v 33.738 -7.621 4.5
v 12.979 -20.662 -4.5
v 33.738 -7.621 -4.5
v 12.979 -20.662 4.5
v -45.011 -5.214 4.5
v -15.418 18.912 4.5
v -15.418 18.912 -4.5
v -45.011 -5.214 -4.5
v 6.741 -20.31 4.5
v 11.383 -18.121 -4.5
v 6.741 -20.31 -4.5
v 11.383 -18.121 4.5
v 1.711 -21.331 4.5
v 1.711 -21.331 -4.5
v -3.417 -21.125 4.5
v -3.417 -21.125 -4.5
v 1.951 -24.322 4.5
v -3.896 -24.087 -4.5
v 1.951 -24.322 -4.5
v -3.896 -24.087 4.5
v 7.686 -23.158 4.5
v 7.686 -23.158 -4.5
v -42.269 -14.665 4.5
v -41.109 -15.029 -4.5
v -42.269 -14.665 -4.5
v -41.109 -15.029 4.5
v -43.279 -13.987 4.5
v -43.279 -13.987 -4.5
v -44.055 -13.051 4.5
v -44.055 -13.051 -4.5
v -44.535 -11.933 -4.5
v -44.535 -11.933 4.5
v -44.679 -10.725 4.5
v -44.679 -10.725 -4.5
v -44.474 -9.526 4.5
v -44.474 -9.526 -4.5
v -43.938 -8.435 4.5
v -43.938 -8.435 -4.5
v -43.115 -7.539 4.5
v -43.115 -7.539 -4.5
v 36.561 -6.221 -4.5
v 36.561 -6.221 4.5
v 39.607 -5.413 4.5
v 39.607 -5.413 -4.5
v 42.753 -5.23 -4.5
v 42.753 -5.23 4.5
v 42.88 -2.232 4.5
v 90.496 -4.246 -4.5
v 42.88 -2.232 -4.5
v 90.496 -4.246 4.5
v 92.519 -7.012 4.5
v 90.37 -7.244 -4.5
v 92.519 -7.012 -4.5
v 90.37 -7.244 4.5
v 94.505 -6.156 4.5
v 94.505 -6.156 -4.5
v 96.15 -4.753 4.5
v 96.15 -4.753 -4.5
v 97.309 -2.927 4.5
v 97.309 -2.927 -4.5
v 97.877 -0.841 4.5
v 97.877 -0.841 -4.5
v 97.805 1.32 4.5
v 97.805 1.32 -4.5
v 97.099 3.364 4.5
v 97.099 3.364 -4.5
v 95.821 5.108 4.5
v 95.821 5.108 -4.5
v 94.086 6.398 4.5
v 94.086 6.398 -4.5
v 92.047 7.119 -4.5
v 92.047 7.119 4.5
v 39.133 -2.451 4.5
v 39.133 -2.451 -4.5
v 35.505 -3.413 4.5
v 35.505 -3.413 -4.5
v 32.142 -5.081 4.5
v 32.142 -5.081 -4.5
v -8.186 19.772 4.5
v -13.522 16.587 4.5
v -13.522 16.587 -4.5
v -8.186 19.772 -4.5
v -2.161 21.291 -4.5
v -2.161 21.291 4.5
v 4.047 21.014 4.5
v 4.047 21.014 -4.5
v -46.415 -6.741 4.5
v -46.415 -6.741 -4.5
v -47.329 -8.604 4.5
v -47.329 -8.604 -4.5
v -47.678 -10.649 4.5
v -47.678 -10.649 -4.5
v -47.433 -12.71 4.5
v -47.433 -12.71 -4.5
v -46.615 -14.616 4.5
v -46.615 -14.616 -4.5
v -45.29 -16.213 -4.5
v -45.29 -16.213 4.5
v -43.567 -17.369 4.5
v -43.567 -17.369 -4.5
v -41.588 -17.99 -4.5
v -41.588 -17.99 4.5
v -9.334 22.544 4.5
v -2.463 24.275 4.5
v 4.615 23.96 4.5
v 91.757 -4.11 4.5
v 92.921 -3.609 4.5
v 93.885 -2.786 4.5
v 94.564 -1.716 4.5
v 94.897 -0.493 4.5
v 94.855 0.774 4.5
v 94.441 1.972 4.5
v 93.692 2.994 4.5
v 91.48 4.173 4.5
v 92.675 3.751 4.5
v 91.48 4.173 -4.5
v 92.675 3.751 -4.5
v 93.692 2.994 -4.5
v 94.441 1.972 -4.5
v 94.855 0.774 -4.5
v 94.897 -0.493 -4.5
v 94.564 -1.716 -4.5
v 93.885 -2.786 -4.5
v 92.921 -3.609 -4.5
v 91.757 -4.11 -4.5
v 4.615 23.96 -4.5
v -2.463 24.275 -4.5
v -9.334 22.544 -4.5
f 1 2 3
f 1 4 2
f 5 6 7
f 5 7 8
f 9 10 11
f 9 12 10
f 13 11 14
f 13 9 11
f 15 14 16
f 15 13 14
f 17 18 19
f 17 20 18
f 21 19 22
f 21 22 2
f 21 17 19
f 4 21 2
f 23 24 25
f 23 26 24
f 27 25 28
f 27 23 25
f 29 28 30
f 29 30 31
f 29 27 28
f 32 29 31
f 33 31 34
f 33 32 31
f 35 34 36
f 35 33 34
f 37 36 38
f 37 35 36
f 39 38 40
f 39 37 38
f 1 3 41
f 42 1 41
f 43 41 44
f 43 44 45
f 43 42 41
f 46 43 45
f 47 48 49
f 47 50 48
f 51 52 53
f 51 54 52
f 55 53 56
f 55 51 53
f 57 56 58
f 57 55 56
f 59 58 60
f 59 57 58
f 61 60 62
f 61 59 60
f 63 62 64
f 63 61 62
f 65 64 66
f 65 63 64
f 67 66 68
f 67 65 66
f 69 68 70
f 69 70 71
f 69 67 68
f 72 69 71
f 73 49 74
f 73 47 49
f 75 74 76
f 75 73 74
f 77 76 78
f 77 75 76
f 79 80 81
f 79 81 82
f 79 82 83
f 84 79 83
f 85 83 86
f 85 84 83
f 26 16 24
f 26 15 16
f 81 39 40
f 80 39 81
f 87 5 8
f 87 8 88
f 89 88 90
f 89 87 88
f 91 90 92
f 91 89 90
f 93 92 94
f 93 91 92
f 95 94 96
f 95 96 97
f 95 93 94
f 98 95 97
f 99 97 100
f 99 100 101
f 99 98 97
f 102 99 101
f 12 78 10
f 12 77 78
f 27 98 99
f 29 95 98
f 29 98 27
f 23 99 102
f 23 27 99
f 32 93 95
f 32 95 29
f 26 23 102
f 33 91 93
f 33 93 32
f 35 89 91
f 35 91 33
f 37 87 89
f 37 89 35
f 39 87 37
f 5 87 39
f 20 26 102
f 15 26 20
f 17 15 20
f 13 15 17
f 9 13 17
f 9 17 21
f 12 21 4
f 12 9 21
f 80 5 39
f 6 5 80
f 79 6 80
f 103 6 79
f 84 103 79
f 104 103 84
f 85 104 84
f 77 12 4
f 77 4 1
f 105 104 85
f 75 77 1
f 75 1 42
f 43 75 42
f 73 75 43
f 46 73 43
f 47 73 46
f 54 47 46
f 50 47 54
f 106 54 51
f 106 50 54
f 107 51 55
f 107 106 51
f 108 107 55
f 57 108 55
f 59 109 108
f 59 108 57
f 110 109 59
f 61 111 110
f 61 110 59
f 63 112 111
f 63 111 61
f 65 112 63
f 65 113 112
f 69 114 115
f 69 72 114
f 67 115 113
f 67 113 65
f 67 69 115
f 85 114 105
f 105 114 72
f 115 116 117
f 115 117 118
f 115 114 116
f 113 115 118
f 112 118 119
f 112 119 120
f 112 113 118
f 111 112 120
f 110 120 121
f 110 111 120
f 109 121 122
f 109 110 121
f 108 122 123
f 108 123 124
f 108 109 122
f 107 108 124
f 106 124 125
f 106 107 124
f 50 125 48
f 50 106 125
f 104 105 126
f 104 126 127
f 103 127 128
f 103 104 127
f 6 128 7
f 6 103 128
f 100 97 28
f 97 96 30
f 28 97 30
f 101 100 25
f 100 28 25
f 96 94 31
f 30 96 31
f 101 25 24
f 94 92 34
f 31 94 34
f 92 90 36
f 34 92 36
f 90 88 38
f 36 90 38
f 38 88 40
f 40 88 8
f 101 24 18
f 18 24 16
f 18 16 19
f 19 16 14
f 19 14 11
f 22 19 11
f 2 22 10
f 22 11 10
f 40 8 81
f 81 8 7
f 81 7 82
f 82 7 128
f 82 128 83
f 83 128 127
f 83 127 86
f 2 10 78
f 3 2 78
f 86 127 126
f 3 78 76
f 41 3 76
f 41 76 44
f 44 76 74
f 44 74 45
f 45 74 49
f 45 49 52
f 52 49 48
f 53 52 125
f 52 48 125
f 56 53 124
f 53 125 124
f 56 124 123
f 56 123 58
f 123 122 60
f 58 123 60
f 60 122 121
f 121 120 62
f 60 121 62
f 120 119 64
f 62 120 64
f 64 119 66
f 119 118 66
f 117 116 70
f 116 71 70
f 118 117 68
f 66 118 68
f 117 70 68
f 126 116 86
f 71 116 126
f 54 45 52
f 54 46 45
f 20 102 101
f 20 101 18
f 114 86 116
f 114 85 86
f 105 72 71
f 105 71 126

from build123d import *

# Parameters (mm, degrees)
RESSALTO_EXTRUS_O1_DEPTH = 4.5


with BuildPart() as part:
    # Esboço1 → Ressalto-extrusão1 (new body, symmetric)
    with BuildSketch(Plane.XY):
        with BuildLine():
            ThreePointArc((90.369647409, -7.243523717), (97.877064824, -0.841102514), (92.047248027, 7.119145574))
            Line((92.047248027, 7.119145574), (4.614891567, 23.959607172))
            ThreePointArc((4.614891567, 23.959607172), (-5.96196459, 23.660409511), (-15.417653704, 18.911794052))
            Line((-15.417653704, 18.911794052), (-45.010991752, -5.213883118))
            ThreePointArc((-45.010991752, -5.213883118), (-47.432888855, -12.709604263), (-41.587603866, -17.990140644))
            Line((-41.587603866, -17.990140644), (-3.896182749, -24.086920932))
            ThreePointArc((-3.896182749, -24.086920932), (4.853764128, -23.912360272), (12.979282584, -20.661515521))
            Line((12.979282584, -20.661515521), (33.738260666, -7.621008284))
            ThreePointArc((33.738260666, -7.621008284), (38.064016153, -5.740396954), (42.753139424, -5.229532527))
            Line((42.753139424, -5.229532527), (90.369647409, -7.243523717))
        make_face()
        with BuildLine():
            ThreePointArc((-13.522040544, 16.586573471), (-5.228936157, 20.751342768), (4.047486866, 21.013753831))
            Line((4.047486866, 21.013753831), (91.479843326, 4.173292233))
            ThreePointArc((91.479843326, 4.173292233), (94.897322138, -0.493060095), (90.496422274, -4.246203558))
            Line((90.496422274, -4.246203558), (42.87991429, -2.232212369))
            ThreePointArc((42.87991429, -2.232212369), (37.294780203, -2.840694201), (32.142447233, -5.080658015))
            Line((32.142447233, -5.080658015), (11.383469151, -18.121165252))
            ThreePointArc((11.383469151, -18.121165252), (4.25698985, -20.972315976), (-3.417143886, -21.12541426))
            Line((-3.417143886, -21.12541426), (-41.108565003, -15.028633972))
            ThreePointArc((-41.108565003, -15.028633972), (-44.535111376, -11.933147128), (-43.115378592, -7.539103698))
            Line((-43.115378592, -7.539103698), (-13.522040544, 16.586573471))
        make_face(mode=Mode.SUBTRACT)
    extrude(amount=RESSALTO_EXTRUS_O1_DEPTH, both=True)


solid = part.part
